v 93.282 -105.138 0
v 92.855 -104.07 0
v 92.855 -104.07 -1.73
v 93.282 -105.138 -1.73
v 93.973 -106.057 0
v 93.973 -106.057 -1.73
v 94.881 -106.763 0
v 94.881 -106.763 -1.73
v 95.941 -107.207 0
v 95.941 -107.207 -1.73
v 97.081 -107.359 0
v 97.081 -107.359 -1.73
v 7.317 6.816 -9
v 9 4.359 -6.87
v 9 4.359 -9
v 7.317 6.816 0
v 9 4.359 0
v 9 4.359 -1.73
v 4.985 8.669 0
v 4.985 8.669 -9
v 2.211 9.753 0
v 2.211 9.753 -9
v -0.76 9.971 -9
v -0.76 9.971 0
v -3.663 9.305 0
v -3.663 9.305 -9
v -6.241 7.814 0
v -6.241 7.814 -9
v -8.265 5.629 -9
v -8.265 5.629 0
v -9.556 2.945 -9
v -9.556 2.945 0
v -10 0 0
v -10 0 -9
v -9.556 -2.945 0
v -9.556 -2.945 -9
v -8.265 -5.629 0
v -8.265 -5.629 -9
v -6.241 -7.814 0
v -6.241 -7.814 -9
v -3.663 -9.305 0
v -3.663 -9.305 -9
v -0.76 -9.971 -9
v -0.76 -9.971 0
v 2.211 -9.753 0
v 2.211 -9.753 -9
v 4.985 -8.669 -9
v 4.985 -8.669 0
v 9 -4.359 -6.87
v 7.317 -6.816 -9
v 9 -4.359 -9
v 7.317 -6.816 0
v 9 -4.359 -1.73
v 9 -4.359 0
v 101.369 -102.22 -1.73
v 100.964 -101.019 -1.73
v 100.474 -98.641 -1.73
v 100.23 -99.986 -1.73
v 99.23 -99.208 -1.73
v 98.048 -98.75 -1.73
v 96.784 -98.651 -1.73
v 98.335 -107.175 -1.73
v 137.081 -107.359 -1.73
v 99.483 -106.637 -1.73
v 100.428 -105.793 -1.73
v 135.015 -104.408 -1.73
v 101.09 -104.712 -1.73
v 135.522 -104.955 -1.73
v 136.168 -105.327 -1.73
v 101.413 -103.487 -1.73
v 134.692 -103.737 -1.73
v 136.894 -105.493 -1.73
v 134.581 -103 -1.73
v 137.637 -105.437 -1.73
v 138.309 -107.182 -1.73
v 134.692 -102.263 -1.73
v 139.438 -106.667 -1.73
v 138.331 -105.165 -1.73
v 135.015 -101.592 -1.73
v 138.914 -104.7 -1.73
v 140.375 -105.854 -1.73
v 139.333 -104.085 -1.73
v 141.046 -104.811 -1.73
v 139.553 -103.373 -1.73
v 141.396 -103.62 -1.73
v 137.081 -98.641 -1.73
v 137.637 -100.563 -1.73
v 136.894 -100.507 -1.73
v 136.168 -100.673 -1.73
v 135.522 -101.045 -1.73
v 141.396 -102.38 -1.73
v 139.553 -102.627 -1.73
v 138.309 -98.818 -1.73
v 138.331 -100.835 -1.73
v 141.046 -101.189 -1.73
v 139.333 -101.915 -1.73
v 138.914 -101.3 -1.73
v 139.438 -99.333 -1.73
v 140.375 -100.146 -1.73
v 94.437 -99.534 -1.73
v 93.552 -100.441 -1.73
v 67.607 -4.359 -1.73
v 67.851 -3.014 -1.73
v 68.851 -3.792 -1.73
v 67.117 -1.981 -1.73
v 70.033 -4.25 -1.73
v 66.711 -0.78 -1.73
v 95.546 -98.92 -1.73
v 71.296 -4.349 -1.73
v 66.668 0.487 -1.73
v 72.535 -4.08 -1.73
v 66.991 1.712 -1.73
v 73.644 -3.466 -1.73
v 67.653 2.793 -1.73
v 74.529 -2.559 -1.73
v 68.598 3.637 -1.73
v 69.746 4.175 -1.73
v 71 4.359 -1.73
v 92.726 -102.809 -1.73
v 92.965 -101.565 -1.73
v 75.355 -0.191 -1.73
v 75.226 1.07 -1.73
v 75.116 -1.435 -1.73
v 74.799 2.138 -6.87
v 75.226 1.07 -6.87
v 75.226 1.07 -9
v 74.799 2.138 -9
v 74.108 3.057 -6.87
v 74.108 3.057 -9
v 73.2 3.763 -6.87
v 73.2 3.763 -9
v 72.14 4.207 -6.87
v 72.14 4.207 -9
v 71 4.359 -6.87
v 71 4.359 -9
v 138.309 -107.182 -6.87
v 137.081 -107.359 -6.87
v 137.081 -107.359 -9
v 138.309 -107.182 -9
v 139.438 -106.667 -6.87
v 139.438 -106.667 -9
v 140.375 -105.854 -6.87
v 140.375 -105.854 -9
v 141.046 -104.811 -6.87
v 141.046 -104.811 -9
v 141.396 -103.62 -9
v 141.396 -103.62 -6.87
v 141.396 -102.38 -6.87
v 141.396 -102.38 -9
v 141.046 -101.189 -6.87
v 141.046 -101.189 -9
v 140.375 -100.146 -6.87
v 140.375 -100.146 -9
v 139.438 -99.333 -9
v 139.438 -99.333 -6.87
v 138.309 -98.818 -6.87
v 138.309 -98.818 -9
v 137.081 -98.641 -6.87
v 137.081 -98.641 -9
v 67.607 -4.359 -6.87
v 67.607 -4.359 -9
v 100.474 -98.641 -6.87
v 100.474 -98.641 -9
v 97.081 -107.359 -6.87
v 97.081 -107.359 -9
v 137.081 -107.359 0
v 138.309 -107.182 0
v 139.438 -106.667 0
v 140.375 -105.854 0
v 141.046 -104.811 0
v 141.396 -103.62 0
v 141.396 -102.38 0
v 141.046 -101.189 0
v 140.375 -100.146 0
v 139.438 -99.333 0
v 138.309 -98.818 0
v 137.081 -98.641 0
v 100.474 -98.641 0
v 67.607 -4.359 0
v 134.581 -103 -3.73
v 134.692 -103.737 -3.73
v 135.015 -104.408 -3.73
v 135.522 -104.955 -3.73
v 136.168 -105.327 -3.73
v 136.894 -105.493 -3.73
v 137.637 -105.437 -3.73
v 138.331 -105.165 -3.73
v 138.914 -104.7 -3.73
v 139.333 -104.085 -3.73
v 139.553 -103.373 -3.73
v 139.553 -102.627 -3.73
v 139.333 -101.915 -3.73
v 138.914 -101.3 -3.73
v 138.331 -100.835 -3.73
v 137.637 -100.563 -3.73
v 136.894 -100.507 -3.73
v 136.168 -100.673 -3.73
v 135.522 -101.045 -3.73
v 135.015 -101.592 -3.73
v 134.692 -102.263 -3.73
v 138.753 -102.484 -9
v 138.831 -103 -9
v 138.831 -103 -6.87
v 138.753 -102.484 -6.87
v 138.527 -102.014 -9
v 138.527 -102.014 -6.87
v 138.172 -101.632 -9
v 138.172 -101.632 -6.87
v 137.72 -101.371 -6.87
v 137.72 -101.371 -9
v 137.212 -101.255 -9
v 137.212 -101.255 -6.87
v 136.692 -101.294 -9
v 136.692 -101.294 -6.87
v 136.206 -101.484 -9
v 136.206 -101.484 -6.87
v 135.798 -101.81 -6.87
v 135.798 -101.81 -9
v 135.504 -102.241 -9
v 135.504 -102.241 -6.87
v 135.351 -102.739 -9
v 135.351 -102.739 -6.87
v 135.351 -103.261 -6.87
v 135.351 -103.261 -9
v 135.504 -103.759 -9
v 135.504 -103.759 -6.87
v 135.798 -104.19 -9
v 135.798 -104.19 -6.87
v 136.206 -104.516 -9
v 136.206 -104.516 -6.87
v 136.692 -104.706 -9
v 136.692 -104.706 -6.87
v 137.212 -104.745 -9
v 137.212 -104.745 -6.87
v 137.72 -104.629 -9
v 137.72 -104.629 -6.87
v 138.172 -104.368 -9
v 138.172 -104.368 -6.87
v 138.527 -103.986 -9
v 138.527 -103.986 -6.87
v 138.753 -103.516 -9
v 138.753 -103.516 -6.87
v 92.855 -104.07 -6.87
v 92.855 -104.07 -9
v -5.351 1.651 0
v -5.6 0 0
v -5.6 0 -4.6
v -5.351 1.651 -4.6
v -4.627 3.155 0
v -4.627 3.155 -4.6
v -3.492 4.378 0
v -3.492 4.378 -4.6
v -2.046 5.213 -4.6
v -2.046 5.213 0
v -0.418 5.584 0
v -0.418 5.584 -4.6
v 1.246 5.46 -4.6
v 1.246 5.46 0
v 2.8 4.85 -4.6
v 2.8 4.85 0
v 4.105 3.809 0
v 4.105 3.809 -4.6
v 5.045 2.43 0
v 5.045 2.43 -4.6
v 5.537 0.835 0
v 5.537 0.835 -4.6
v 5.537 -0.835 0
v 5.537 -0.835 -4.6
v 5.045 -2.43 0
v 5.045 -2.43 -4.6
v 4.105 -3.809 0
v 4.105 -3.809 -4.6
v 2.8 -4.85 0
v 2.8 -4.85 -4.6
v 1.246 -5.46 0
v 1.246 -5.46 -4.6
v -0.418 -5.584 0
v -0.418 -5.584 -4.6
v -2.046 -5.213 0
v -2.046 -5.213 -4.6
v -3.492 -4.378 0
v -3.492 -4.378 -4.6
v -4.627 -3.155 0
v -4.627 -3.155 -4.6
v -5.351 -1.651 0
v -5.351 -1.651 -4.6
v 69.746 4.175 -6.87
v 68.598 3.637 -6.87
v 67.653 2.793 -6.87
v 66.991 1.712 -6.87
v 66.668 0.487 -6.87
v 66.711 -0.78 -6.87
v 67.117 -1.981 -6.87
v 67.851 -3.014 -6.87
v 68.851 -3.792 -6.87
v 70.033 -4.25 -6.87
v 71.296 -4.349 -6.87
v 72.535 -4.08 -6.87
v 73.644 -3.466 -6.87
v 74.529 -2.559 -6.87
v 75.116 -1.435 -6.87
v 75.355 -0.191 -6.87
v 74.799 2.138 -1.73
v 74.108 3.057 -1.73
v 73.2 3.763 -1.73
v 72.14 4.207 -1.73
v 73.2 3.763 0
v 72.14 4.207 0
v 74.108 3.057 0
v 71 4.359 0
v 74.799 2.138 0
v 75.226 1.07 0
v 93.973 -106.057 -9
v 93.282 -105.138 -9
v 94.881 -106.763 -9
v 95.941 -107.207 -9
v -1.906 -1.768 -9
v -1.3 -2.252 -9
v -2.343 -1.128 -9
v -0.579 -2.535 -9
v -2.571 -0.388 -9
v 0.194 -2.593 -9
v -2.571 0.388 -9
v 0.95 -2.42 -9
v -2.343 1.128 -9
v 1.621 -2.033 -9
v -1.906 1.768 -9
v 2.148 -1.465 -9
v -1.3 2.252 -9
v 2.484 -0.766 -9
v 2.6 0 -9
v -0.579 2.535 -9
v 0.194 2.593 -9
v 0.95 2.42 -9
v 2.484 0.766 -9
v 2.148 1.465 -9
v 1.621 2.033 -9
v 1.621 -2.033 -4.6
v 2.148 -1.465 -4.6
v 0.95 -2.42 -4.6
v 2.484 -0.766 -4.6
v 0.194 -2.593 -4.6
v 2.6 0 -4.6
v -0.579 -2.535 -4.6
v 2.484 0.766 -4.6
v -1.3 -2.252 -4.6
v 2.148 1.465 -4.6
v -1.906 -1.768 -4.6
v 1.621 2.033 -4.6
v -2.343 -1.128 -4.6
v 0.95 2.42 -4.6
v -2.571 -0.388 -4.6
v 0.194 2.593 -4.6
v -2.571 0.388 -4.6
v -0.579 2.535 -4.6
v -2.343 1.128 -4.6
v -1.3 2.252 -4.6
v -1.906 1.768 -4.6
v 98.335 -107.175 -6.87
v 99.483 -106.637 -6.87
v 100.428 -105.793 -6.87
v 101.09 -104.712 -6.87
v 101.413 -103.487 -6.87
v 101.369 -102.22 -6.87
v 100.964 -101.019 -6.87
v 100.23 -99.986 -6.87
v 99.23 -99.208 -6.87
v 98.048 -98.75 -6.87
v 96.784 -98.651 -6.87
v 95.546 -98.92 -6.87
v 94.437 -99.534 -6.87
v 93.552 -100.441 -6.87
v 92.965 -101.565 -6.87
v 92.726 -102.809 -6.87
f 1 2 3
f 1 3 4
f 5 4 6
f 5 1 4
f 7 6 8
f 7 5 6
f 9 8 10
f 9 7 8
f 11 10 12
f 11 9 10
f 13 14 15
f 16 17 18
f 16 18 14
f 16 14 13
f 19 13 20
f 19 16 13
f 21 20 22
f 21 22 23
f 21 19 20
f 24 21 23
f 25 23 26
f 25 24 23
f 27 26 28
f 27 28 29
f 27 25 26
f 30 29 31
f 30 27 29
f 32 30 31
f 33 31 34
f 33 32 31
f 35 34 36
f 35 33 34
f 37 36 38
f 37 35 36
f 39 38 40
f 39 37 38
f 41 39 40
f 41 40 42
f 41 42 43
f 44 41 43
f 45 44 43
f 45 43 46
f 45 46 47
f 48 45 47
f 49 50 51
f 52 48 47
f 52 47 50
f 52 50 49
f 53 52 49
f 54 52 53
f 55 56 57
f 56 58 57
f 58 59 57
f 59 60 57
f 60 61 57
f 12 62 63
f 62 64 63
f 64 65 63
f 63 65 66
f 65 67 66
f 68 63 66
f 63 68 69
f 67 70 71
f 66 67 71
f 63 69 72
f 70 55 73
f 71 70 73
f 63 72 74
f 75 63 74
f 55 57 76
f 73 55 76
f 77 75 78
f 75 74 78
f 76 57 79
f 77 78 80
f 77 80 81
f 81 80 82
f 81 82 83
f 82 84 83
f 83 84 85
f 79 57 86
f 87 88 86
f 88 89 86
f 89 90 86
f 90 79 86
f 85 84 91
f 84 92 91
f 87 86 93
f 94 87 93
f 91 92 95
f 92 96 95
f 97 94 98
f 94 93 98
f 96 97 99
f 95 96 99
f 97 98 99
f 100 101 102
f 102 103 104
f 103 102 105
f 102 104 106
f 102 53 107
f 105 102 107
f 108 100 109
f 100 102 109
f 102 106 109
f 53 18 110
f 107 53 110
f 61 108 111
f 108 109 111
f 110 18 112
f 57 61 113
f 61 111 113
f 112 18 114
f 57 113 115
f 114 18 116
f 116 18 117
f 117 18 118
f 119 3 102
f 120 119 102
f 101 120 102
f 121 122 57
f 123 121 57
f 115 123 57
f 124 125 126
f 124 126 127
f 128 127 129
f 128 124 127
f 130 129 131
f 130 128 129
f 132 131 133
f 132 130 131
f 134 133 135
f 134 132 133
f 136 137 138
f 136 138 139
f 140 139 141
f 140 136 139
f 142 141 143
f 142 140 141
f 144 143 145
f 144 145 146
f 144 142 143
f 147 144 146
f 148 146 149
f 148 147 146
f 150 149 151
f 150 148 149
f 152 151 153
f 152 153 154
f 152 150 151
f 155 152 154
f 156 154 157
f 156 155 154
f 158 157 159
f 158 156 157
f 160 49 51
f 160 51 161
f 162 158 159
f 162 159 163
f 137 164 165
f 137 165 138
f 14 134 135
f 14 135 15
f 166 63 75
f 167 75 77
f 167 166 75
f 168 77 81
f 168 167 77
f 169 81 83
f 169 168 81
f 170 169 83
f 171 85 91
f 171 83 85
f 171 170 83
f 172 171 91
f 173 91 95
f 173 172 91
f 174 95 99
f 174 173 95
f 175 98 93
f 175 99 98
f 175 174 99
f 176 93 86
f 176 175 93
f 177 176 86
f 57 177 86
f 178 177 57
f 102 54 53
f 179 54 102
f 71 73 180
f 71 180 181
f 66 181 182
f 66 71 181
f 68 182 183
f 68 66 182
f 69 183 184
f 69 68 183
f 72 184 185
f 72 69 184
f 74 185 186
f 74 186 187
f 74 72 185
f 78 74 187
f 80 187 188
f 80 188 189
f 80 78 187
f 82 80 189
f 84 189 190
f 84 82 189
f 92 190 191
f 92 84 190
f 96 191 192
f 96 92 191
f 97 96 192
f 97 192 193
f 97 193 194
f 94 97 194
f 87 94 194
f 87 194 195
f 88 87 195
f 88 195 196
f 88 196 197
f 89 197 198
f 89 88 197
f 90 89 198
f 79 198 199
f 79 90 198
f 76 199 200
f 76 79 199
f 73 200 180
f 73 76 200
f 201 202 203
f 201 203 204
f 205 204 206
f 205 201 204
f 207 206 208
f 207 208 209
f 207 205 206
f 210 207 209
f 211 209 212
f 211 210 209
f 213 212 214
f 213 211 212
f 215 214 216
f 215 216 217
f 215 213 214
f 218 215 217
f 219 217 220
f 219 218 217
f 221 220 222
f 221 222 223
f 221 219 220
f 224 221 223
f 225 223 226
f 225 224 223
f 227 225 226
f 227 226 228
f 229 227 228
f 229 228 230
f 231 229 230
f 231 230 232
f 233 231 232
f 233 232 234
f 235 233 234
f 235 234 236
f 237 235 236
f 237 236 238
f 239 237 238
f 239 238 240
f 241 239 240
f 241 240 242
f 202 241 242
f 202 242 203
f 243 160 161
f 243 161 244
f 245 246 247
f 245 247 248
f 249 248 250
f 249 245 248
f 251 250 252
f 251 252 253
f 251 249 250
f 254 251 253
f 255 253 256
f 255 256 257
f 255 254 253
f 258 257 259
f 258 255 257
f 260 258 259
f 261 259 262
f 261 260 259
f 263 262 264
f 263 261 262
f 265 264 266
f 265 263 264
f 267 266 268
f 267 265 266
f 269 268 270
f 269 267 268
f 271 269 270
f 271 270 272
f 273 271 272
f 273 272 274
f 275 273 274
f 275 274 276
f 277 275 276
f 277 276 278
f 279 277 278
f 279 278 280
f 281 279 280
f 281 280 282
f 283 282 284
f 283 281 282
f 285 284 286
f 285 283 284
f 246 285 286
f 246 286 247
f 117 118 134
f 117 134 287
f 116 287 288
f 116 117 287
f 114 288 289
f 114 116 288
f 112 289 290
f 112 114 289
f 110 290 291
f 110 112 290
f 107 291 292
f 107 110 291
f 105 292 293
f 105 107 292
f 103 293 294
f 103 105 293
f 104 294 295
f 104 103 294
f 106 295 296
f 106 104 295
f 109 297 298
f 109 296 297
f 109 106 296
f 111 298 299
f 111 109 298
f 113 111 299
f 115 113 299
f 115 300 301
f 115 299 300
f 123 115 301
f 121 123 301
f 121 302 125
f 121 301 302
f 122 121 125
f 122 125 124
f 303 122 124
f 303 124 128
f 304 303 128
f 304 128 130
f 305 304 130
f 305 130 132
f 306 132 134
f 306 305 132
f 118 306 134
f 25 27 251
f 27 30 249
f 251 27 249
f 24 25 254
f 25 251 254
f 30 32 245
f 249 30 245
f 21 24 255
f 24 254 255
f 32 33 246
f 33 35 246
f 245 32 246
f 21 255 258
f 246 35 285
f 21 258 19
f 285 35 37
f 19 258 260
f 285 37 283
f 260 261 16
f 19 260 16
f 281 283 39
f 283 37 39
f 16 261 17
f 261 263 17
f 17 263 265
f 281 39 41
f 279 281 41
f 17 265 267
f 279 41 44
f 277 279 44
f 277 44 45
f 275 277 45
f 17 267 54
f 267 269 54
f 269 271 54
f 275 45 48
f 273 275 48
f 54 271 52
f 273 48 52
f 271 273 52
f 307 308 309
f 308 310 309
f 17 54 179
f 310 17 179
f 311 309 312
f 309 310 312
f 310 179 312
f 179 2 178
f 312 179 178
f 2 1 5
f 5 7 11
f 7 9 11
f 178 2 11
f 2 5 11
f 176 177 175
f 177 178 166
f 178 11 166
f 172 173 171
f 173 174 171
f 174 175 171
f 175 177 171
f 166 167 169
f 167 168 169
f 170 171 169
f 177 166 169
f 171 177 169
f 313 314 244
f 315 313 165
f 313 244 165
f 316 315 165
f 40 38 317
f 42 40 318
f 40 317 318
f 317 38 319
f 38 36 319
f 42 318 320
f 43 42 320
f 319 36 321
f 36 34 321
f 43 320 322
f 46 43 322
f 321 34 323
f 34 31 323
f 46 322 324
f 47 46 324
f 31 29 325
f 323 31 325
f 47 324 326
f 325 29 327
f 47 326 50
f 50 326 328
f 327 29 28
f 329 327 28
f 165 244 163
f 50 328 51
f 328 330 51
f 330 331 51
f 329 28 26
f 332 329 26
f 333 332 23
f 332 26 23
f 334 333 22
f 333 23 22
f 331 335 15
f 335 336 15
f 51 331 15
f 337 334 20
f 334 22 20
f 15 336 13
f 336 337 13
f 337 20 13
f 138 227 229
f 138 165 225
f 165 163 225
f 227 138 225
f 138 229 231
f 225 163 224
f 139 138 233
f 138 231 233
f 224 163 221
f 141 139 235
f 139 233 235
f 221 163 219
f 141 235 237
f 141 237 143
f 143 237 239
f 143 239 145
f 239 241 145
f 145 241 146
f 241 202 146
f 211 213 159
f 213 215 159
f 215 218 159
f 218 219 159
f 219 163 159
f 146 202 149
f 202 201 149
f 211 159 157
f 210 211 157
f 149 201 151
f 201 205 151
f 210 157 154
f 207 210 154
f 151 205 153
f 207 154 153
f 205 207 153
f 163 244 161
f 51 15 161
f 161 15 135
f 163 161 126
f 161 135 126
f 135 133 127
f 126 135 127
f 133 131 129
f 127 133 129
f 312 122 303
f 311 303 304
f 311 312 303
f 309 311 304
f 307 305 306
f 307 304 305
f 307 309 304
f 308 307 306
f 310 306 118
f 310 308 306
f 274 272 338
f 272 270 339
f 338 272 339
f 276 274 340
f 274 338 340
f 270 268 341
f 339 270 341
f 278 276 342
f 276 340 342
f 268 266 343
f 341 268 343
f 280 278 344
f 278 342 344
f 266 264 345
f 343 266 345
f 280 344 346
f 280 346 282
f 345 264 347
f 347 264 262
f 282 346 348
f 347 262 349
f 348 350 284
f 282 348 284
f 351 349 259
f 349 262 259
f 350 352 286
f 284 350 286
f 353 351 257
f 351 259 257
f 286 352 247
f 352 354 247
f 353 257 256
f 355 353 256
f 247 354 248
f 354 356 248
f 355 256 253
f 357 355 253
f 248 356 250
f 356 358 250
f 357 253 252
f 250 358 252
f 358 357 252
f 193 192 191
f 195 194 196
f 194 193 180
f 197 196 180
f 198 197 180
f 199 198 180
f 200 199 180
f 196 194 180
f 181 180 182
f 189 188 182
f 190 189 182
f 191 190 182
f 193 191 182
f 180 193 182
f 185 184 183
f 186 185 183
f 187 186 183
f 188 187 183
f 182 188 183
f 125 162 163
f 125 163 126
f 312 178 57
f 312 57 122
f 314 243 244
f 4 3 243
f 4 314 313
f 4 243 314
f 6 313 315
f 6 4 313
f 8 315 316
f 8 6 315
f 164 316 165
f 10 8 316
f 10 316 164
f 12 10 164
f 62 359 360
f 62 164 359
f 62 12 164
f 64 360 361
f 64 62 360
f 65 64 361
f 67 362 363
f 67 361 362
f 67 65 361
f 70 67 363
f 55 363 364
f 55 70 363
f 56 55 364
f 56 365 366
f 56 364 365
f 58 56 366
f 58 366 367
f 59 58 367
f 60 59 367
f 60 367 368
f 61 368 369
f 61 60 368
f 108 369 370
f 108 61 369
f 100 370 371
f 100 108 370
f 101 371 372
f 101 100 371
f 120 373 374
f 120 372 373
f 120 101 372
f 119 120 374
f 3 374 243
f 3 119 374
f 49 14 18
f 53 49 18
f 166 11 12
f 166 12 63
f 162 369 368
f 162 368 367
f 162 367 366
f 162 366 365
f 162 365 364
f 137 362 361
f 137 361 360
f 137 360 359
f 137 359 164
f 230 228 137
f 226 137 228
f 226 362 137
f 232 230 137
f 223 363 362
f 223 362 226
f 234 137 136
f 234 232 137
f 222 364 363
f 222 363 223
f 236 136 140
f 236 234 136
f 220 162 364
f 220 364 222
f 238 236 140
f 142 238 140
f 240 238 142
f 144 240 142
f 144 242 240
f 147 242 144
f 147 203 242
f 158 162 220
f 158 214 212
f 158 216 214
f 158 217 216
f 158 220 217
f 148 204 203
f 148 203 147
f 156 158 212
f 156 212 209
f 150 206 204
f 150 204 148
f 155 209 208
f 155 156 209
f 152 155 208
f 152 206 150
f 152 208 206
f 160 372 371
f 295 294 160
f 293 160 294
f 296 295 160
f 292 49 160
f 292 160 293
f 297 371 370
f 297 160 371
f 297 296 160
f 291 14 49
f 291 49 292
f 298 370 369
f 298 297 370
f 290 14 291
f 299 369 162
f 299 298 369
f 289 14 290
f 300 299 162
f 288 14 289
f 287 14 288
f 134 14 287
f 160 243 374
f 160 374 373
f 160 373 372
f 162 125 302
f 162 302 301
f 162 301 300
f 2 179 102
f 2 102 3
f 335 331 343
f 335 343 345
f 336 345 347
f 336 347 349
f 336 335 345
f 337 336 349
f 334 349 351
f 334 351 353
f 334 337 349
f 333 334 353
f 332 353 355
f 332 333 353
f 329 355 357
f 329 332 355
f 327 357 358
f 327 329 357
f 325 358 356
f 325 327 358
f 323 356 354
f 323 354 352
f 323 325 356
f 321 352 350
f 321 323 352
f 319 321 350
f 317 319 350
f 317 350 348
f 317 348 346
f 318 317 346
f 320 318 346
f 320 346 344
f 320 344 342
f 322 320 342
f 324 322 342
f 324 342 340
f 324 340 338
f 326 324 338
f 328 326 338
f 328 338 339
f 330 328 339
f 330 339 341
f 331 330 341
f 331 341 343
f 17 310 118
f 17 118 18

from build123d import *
from build123d.topology import SkipClean

# Parameters (mm, degrees)
EXTRUDE_1_DEPTH          = 9
SKETCH_2_R               = 5.6
CUT_EXTRUDE_1_DEPTH      = 4.6
SKETCH_3_R               = 2.6
CUT_EXTRUDE_2_DEPTH      = 178.798114195
SKETCH_5_W               = 132.43986789
SKETCH_5_H               = 5.139725872
CUT_EXTRUDE_3_DEPTH      = 181.463576917
EXTRUDE_START            = -7.270147681
SKETCH_6_R               = 4.358898944
EXTRUDE_2_DEPTH          = 7.270147681
SKETCH_7_R               = 4.358898944
EXTRUDE_3_DEPTH          = 7.270147681
SKETCH_8_R               = 2.5
EXTRUDE_4_DEPTH          = 2
CUT_EXTRUDE_4_REACH      = 179.798
SKETCH_9_R               = 1.75
CUT_EXTRUDE_5_DEPTH      = 181.463576917
CUT_EXTRUDE_5_DEPTH_BACK = 181.463576917
SKETCH_12_W              = 151.43986789
SKETCH_12_H              = 9


with BuildPart() as part:
    # 草图1 → 凸台-拉伸1 (new body)
    with BuildSketch(Plane.XY):
        with BuildLine():
            Line((97.080968947, -107.358898944), (137.080968947, -107.358898944))
            ThreePointArc((137.080968947, -107.358898944), (141.43986789, -103), (137.080968947, -98.641101056))
            Line((137.080968947, -98.641101056), (100.473705575, -98.641101056))
            Line((100.473705575, -98.641101056), (75.225539013, 1.069962639))
            ThreePointArc((75.225539013, 1.069962639), (73.67732525, 3.439757187), (71, 4.358898944))
            Line((71, 4.358898944), (9, 4.358898944))
            ThreePointArc((9, 4.358898944), (-10, 0), (9, -4.358898944))
            Line((9, -4.358898944), (67.607263372, -4.358898944))
            Line((67.607263372, -4.358898944), (92.855429934, -104.069962639))
            ThreePointArc((92.855429934, -104.069962639), (94.403643697, -106.439757187), (97.080968947, -107.358898944))
        make_face()
    extrude(amount=EXTRUDE_1_DEPTH)

    # 草图2 → 切除-拉伸1 (cut)
    with BuildSketch(Plane(origin=(0, 0, 0), x_dir=(-1, 0, 0), z_dir=(0, 0, -1))):
        Circle(SKETCH_2_R)
    extrude(amount=-CUT_EXTRUDE_1_DEPTH, mode=Mode.SUBTRACT)

    # 草图3 → 切除-拉伸2 (cut, through all)
    with BuildSketch(Plane.XY.offset(9)):
        Circle(SKETCH_3_R)
    extrude(amount=-CUT_EXTRUDE_2_DEPTH, mode=Mode.SUBTRACT)

    # 草图5 → 切除-拉伸3 (cut, through all)
    with BuildSketch(Plane(origin=(0, 4.358898944, 0), x_dir=(1, 0, 0), z_dir=(0, 1, 0))):
        with Locations((75.219933945, -4.299715255)):
            Rectangle(SKETCH_5_W, SKETCH_5_H)
    extrude(amount=-CUT_EXTRUDE_3_DEPTH, mode=Mode.SUBTRACT)

    # 草图6 → 凸台-拉伸2 (add)
    with SkipClean():  # the faces are left unmerged after this step: merging them gives an invalid solid
        with BuildSketch(Plane.XY.offset(9).offset(EXTRUDE_START)):
            with Locations(Location((71, 0, 0), (0, 0, 90))):
                Circle(SKETCH_6_R)
        extrude(amount=EXTRUDE_2_DEPTH)

    # 草图7 → 凸台-拉伸3 (add)
    with SkipClean():  # the faces are left unmerged after this step: merging them gives an invalid solid
        with BuildSketch(Plane.XY.offset(9).offset(EXTRUDE_START)):
            with Locations(Location((97.080968947, -103, 0), (0, 0, 194.209390146))):
                Circle(SKETCH_7_R)
        extrude(amount=EXTRUDE_3_DEPTH)

    # 草图8 → 凸台-拉伸4 (add)
    with SkipClean():  # the faces are left unmerged after this step: merging them gives an invalid solid
        with BuildSketch(Plane.XY.offset(1.729852319)):
            with Locations(Location((137.080968947, -103, 0), (0, 0, 180))):
                Circle(SKETCH_8_R)
        extrude(amount=EXTRUDE_4_DEPTH)

    # 草图9 → 切除-拉伸4 (cut, up to next)
    with BuildSketch(Plane.XY.offset(9), mode=Mode.PRIVATE) as cut_extrude_4_sk1:
        with Locations((137.080968947, -103)):
            Circle(SKETCH_9_R)
    cut_extrude_4_tool1 = extrude(cut_extrude_4_sk1.sketch, amount=-CUT_EXTRUDE_4_REACH, mode=Mode.PRIVATE) & part.part
    add(cut_extrude_4_tool1.solids().sort_by_distance((137.080969, -103, 9))[0], mode=Mode.SUBTRACT)

    # 镜向8: part across plane


with BuildPart() as part_1:
    add(part.part)
    add(part.part.mirror(Plane.XY))

    # 草图12 → 切除-拉伸5 (cut, two sides: drawn at the far end of the back side and taken through both)
    with BuildSketch(Plane(origin=(0, 4.358898944, 0), x_dir=(1, 0, 0), z_dir=(0, 1, 0)).offset(-CUT_EXTRUDE_5_DEPTH_BACK)):
        with Locations((65.719933945, -4.5)):
            Rectangle(SKETCH_12_W, SKETCH_12_H)
    extrude(amount=CUT_EXTRUDE_5_DEPTH + CUT_EXTRUDE_5_DEPTH_BACK, mode=Mode.SUBTRACT)


solid = part_1.part
